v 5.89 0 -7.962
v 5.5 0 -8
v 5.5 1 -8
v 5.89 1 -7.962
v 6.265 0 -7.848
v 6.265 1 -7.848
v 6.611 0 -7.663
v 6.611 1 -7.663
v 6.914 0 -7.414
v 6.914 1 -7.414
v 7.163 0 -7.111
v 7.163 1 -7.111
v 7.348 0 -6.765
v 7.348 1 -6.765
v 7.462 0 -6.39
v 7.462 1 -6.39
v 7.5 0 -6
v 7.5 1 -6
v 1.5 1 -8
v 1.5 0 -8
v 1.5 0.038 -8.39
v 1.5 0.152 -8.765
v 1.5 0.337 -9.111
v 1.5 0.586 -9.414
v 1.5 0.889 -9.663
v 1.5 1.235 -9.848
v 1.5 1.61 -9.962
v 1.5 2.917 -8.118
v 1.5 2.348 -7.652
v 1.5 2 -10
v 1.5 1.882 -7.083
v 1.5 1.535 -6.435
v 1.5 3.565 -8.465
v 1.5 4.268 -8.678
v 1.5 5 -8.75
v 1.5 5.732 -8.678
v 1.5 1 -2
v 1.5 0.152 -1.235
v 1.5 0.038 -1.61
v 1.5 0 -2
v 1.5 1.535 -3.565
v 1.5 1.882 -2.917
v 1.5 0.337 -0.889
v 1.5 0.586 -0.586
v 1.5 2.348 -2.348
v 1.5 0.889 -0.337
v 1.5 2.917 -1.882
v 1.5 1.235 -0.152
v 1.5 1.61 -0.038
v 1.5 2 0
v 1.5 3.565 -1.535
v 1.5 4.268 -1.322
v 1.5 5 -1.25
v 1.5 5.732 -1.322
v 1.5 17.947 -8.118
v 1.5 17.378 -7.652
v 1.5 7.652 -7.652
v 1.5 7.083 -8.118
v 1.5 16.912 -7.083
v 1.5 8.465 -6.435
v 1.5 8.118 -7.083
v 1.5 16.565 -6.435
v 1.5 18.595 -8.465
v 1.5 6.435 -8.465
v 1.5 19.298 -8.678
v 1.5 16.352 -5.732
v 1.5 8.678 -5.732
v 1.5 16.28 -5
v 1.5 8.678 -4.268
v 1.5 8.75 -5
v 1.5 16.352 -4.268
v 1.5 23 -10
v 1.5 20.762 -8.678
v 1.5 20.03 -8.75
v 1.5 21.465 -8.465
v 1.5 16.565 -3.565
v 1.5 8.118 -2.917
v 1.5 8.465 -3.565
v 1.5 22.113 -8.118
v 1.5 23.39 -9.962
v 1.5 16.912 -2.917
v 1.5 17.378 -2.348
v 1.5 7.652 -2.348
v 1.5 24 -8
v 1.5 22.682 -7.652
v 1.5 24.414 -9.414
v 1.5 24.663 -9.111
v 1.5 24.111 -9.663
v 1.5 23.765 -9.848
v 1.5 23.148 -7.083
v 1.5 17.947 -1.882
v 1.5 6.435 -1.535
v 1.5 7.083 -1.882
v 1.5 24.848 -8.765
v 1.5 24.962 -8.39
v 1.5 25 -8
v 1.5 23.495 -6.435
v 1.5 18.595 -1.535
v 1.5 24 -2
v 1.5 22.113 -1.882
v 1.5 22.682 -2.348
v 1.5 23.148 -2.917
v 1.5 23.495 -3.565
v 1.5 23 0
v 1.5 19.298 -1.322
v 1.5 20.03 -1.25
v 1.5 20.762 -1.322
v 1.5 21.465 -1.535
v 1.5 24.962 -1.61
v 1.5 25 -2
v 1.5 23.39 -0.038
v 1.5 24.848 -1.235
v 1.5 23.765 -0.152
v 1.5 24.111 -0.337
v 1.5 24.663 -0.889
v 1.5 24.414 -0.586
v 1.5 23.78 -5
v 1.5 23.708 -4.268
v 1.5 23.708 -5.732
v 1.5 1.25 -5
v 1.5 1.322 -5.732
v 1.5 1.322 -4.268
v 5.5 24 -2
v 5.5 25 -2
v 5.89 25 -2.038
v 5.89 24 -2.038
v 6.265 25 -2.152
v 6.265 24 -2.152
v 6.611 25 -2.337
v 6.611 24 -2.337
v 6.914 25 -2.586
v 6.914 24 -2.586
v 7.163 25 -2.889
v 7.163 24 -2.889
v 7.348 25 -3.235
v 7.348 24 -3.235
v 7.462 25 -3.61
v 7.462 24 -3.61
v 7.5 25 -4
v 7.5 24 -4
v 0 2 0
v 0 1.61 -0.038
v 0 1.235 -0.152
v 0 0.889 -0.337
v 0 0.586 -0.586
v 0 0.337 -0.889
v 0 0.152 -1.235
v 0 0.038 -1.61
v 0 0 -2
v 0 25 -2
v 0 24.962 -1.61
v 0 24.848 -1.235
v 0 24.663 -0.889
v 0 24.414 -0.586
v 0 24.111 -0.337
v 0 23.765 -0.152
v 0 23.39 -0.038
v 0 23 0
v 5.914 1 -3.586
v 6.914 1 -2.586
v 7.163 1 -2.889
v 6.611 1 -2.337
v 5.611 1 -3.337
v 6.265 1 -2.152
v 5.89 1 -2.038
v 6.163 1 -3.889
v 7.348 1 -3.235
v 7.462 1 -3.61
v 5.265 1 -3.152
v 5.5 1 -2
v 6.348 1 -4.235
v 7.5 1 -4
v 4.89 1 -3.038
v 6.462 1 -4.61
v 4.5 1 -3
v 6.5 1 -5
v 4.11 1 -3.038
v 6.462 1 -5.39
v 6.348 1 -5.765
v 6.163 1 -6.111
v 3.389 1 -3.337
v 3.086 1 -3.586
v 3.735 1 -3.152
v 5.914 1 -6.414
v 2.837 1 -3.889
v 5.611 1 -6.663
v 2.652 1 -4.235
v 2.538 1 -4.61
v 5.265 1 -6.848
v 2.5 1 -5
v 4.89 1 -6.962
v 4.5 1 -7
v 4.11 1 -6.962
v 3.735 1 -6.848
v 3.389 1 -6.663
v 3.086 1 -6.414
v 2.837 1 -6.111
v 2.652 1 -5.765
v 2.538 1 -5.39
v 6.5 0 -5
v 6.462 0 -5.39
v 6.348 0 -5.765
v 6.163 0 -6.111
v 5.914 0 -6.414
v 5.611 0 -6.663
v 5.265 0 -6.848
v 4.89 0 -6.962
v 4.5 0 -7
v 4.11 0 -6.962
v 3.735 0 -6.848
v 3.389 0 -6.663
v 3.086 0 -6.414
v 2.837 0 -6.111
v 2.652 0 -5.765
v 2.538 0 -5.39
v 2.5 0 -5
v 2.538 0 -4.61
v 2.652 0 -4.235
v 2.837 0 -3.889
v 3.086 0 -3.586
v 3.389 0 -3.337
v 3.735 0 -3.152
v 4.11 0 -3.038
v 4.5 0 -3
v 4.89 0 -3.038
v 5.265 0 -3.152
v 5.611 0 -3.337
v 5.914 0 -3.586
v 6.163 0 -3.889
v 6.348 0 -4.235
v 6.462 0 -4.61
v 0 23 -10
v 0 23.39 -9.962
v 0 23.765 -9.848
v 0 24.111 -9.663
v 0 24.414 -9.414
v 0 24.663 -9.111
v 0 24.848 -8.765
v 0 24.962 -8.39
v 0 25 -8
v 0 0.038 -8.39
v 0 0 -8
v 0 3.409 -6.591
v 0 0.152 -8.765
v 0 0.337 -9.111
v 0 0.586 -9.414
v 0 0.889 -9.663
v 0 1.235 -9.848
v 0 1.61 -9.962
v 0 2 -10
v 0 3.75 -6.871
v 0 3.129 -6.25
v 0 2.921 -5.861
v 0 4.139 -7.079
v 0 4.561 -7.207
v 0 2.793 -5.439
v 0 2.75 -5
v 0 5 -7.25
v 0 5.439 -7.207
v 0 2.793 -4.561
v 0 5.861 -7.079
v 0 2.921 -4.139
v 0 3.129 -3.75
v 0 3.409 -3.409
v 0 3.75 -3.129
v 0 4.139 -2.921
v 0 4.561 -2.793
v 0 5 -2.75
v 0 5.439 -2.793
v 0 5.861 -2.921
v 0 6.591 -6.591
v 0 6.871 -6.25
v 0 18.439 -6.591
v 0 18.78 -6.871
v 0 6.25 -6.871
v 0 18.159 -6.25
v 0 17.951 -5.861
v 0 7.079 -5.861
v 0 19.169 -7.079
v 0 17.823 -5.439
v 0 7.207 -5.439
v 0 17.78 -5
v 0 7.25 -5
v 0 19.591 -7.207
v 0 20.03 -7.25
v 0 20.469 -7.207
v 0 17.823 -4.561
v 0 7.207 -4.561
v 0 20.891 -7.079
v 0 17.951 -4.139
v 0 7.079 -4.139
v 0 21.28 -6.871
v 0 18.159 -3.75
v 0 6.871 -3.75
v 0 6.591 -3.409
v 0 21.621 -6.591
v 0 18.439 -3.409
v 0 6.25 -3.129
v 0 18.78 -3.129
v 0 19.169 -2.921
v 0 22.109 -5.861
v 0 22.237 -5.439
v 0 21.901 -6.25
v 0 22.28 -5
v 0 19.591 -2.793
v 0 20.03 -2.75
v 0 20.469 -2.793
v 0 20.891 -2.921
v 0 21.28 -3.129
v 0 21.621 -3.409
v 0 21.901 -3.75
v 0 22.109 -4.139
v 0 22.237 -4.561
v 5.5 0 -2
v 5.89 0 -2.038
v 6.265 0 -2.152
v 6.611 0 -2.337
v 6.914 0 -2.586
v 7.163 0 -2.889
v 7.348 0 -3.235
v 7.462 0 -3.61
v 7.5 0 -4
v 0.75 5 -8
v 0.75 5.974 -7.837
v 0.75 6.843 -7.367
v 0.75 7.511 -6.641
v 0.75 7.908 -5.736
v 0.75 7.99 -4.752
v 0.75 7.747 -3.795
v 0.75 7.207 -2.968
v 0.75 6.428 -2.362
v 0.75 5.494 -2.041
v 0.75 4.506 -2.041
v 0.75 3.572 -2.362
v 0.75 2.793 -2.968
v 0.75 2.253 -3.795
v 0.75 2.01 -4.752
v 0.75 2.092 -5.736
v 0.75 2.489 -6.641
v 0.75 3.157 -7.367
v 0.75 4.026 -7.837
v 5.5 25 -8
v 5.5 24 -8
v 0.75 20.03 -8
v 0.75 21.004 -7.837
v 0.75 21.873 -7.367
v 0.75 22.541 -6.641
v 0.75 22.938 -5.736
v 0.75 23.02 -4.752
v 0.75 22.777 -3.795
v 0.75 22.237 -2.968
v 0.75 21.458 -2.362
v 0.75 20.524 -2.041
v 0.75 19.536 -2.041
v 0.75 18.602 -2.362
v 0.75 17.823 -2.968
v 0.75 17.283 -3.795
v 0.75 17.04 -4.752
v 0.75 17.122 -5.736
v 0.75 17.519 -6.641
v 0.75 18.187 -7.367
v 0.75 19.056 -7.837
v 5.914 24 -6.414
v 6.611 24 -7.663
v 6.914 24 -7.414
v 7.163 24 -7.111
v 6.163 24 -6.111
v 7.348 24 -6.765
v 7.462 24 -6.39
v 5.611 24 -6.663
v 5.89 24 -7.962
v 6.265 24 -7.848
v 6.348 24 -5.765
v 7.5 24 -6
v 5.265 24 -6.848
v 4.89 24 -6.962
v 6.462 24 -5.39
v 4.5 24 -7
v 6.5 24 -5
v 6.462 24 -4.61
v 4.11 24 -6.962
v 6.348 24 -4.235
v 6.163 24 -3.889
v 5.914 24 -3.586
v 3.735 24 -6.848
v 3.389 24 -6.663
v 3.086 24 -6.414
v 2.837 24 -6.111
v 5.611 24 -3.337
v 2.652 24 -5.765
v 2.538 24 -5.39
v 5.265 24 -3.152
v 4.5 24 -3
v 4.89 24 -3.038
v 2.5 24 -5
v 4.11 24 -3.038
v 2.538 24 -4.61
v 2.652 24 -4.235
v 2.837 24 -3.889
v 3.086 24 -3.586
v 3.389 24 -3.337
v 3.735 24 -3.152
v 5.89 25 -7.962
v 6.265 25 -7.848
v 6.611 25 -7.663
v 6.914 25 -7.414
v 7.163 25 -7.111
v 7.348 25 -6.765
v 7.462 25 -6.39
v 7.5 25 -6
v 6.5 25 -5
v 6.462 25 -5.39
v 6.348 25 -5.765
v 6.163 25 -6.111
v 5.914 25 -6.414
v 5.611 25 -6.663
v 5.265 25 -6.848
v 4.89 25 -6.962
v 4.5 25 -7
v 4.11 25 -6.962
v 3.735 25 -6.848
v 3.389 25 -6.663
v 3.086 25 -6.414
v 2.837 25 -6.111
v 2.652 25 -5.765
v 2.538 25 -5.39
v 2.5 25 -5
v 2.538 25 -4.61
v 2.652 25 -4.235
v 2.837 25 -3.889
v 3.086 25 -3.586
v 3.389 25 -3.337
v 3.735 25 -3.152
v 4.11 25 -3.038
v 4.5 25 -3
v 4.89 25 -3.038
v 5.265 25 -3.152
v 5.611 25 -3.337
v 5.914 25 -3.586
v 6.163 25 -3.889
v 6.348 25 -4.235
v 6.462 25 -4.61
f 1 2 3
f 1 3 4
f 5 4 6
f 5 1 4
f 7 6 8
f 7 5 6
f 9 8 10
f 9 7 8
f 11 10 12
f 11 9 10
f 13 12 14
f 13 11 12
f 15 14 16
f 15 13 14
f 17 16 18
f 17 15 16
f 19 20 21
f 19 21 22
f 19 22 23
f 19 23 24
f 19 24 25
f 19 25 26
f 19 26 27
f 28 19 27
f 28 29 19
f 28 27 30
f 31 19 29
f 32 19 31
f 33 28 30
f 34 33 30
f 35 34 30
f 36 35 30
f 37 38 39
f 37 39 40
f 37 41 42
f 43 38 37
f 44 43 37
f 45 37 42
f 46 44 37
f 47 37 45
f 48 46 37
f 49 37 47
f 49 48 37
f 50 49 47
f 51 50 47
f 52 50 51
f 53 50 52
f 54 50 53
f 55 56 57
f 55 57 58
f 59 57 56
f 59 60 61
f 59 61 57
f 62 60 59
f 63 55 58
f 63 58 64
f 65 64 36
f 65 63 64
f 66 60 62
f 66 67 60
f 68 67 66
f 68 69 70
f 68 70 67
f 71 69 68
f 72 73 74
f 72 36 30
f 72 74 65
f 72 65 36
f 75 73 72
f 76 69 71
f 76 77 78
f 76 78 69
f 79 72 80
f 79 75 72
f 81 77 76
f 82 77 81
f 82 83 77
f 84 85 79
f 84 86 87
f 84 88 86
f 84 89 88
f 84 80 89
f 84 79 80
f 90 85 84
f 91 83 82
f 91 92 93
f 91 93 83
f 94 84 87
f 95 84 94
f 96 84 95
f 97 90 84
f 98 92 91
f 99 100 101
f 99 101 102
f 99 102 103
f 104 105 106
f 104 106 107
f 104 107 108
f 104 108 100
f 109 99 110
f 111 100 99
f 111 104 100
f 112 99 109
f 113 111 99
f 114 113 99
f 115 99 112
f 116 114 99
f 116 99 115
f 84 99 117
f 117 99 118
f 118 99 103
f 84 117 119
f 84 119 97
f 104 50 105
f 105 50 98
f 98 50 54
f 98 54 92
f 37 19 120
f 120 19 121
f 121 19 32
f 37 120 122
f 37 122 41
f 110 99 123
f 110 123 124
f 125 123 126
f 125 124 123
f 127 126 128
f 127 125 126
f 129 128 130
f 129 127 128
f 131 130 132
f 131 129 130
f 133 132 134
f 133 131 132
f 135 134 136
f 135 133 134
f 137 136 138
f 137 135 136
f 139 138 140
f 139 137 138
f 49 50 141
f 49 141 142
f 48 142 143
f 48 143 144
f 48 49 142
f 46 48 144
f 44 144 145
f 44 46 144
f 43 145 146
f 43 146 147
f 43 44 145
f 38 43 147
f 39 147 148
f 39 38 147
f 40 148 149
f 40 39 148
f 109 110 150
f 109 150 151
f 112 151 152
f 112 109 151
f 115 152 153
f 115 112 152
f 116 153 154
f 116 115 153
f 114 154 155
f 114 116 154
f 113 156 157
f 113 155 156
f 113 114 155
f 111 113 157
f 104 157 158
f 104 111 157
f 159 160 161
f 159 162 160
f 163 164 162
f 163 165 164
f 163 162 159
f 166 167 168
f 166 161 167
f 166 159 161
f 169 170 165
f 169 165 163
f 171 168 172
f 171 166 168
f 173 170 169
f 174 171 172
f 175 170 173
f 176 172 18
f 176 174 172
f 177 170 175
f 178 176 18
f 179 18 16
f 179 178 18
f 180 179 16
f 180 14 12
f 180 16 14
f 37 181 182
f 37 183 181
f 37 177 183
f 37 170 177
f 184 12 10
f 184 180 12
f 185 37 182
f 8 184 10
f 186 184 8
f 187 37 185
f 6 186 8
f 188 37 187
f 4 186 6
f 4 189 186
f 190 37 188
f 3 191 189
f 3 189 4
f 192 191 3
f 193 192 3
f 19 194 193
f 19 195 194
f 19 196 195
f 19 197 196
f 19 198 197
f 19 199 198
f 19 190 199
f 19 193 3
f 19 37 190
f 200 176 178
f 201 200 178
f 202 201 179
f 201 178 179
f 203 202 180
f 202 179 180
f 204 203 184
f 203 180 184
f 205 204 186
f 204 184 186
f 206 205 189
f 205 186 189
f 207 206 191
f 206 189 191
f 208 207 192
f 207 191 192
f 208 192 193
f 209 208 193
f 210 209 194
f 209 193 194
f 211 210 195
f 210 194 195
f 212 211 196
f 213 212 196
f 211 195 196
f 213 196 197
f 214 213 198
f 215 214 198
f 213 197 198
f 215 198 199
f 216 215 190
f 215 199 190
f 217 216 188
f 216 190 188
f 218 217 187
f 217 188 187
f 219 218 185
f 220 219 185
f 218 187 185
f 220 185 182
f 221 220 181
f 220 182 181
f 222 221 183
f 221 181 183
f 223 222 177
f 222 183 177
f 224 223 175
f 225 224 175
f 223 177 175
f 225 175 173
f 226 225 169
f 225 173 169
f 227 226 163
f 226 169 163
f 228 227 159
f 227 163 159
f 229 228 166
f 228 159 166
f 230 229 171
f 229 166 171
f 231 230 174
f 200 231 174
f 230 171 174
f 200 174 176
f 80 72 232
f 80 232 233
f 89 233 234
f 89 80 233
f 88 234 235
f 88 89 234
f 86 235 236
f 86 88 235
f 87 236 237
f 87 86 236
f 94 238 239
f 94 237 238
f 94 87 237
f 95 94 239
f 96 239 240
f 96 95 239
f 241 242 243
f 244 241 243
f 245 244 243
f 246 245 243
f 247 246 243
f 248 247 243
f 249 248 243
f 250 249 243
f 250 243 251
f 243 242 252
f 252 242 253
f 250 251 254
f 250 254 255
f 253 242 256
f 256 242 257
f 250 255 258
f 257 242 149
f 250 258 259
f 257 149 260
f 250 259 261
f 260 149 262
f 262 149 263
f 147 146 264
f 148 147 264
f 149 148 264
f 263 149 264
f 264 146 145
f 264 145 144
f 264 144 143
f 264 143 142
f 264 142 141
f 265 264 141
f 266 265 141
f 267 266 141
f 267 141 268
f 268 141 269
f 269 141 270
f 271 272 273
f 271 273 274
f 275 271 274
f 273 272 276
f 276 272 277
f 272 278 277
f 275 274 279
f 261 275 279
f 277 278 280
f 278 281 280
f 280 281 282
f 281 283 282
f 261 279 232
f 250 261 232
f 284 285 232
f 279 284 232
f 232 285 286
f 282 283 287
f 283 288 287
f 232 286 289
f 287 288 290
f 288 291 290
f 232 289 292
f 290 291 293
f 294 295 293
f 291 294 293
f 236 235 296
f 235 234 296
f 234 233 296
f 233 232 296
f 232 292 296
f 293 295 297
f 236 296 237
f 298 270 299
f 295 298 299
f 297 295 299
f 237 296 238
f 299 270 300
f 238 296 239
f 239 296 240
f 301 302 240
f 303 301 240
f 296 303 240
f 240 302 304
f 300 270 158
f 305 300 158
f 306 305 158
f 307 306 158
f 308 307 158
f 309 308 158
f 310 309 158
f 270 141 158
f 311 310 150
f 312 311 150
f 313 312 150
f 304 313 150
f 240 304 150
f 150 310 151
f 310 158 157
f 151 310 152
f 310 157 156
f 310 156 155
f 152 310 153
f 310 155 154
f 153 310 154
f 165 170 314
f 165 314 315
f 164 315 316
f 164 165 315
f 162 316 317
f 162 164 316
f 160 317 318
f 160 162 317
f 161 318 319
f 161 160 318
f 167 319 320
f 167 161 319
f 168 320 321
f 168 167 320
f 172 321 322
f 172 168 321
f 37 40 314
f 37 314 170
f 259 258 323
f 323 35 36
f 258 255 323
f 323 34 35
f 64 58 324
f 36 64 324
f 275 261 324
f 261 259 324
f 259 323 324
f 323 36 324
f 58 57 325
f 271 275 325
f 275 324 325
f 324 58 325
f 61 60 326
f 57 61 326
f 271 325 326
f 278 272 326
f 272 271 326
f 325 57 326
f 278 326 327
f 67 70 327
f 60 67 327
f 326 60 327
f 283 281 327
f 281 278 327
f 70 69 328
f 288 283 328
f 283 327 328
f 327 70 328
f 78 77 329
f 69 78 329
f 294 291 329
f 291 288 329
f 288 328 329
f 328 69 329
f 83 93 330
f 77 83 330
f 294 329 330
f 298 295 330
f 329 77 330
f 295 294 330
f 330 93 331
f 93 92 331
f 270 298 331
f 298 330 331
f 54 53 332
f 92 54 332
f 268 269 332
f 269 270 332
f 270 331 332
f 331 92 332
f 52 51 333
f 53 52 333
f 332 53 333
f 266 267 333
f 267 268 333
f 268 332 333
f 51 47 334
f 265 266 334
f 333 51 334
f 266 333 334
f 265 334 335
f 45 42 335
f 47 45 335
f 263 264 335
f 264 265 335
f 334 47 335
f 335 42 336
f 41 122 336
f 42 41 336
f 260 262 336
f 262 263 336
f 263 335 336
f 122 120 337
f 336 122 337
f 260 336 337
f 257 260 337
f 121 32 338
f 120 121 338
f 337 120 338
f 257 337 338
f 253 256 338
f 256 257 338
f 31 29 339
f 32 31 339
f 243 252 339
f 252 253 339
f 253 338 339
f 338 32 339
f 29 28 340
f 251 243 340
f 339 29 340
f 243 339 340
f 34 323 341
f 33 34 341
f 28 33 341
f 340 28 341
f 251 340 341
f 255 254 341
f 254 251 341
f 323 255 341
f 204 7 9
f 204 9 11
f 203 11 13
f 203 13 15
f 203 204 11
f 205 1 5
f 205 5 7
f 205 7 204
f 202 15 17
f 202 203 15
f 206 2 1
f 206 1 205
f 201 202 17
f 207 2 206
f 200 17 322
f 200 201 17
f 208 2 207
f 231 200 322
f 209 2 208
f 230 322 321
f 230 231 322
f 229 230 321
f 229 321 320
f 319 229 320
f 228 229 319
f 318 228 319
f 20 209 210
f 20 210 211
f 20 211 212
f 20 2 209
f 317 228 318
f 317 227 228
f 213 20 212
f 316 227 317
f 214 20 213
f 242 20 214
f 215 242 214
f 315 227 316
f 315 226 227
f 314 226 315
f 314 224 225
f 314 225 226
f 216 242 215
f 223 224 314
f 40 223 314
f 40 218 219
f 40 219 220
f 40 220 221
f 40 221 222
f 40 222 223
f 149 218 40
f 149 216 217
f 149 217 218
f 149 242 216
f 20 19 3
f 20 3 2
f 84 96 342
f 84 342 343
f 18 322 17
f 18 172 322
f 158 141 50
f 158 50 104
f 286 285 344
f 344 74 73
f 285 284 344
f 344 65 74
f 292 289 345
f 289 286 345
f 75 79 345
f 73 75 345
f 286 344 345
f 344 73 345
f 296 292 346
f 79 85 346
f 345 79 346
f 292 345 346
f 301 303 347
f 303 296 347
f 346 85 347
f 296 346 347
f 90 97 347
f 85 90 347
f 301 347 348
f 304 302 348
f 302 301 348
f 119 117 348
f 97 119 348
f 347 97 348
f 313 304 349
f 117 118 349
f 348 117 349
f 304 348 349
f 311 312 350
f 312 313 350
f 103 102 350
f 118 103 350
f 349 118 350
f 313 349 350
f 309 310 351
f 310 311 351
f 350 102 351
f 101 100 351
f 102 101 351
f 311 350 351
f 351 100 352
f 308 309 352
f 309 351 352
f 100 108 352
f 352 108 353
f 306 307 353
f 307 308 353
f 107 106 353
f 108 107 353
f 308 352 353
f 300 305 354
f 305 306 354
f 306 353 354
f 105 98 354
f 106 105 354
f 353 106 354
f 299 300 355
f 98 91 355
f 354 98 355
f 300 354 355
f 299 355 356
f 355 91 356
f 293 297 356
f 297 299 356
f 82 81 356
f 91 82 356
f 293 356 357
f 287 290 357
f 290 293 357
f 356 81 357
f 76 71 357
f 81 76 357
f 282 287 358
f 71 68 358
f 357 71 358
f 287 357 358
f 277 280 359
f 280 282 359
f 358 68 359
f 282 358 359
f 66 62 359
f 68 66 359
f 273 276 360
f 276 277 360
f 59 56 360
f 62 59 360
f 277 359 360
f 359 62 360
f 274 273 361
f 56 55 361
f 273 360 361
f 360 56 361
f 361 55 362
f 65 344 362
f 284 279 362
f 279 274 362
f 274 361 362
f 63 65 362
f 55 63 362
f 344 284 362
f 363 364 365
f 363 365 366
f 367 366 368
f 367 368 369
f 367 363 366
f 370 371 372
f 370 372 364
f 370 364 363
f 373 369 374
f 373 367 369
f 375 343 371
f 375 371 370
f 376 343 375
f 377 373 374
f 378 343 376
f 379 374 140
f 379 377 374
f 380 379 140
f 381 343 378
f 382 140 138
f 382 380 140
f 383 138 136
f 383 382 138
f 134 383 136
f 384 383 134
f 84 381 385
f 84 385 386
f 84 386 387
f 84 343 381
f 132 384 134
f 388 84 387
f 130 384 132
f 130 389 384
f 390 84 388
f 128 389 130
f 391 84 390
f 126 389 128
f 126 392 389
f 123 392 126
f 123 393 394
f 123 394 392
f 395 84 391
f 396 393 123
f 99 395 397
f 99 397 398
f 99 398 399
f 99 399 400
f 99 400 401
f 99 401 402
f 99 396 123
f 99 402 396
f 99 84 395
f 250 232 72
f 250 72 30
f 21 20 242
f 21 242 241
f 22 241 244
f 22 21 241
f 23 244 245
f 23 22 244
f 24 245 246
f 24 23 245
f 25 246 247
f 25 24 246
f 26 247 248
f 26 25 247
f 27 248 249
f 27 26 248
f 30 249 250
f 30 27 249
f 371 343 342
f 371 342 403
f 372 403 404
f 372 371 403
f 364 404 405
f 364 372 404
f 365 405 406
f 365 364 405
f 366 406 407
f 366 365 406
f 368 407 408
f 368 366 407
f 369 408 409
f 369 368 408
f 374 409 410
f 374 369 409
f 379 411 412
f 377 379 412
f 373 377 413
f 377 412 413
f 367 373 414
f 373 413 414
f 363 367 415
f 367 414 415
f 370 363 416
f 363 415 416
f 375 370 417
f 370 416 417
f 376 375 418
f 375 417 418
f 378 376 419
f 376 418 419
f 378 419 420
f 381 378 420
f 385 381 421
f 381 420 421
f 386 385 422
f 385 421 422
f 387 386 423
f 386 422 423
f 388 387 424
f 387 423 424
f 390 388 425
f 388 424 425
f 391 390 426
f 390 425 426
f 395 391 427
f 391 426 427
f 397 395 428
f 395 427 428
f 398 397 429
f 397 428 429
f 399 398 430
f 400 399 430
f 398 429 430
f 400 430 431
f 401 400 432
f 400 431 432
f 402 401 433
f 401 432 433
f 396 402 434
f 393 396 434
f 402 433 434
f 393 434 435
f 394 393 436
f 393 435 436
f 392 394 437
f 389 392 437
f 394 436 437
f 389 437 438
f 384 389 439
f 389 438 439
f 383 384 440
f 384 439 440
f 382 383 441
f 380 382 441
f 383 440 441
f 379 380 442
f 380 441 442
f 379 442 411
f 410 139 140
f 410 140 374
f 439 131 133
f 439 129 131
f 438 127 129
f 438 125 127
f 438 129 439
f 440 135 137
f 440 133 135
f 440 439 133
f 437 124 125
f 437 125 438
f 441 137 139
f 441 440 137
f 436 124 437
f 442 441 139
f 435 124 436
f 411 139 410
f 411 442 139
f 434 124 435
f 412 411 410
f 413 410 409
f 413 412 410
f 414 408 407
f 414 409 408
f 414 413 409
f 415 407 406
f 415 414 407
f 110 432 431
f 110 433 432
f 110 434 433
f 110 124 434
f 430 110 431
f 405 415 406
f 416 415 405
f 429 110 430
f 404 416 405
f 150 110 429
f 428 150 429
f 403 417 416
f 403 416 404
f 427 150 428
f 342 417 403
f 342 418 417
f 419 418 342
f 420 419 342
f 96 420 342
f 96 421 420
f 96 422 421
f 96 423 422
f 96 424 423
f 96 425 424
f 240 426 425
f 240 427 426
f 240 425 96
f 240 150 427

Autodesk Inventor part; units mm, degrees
ref_plane "YZ Plane" through (0, 0, 0) normal (1, 0, 0) x (0, 1, 0)
ref_plane "XZ Plane" through (0, 0, 0) normal (0, 1, 0) x (-1, 0, 0)
ref_plane "XY Plane" through (0, 0, 0) normal (0, 0, 1) x (1, 0, 0)
sketch "Esboço1" plane through (0, 0, 0) normal (1, 0, 0) x (0, 1, 0)
  line L0 (0, 0) -> (25, 0)
  line L1 (25, 0) -> (25, -10)
  line L2 (25, -10) -> (0, -10)
  line L3 (0, -10) -> (0, 0)
  point P0 (20.25, -5)
  point P1 (4.75, -5)
  dimension "d0" = 25
  dimension "d1" = 10
extrude "Extrusão1" add sketch "Esboço1" along normal blind 1.5
fillet "Arredondamento1" radius 2 1 edges at (0.75, 25, 0)
fillet "Arredondamento2" radius 2 1 edges at (0.75, 25, -10)
fillet "Arredondamento3" radius 2 1 edges at (0.75, 0, 0)
fillet "Arredondamento4" radius 2 1 edges at (0.75, 0, -10)
sketch "Esboço2" plane through (1.5, 0, 0) normal (1, 0, 0) x (0, 0, -1)
  line L0 (8, 25) -> (2, 25) projected
  line L1 (5, 25) -> (5, 0)
  line L2 (2, 0) -> (8, 0) projected
  circle A0 centre (5, 5) radius 3.75
  circle A1 centre (5, 20.03) radius 3.75
  point P0 (0, 0)
  dimension "d12" = 4.97
  dimension "d13" = 5
  dimension "d15" = 7.5
  dimension "d16" = 7.5
hole "Furo1" at (1.5, 20.03, -5) at (1.5, 5, -5) direction (-1, 0, 0) diameter 4 depth 2 tip angle 118 countersink diameter 7.5 countersink angle 90
sketch "Esboço3" plane through (1.5, 0, 0) normal (1, 0, 0) x (0, 0, -1)
  arc A0 (8, 0) -> (10, 2) centre (8, 2) ccw projected
  line L0 (8, 0) -> (2, 0)
  line L1 (2, 0) -> (2, 1)
  line L2 (2, 1) -> (8, 1)
  line L3 (8, 1) -> (8, 0)
  point P0 (0, 0)
  dimension "d24" = 1
  dimension "d25" = 6
extrude "Extrusão2" add sketch "Esboço3" along normal blind 6
fillet "Arredondamento5" radius 2 1 edges at (7.5, 0.5, -8)
fillet "Arredondamento6" radius 2 1 edges at (7.5, 0.5, -2)
pattern_linear "Padrão retangular1" count 2 spacing 24 along (0, 1, 0) of "Extrusão2"
fillet "Arredondamento7" radius 2 1 edges at (7.5, 24.5, -8)
fillet "Arredondamento8" radius 2 1 edges at (7.5, 24.5, -2)
sketch "Esboço4" plane through (0, 25, -2) normal (0, 1, 0) x (1, 0, 0)
  line L0 (1.5, 6) -> (5.5, 6) projected
  line L1 (1.5, 0) -> (5.5, 0) projected
  line L2 (7.5, 2) -> (7.5, 4) projected
  circle A0 centre (4.5, 3) radius 2
  point P0 (0, -2)
  dimension "d37" = 4
extrude "Extrusão3" cut sketch "Esboço4" against normal through all
sketch "Esboço5" plane through (1.5, 0, 0) normal (1, 0, 0) x (0, 0, -1)
  line L0 (6, 25) -> (4, 25) projected
  line L1 (4, 0) -> (6, 0) projected
  point P0 (0, 0)
  point P1 (5, 25)
  dimension "d40" = 25
sketch "Esboço6" plane through (1.5, 0, 0) normal (1, 0, 0) x (0, 0, -1)
  point P0 (0, 0)
properties part number "TRILHO LATERAL"
